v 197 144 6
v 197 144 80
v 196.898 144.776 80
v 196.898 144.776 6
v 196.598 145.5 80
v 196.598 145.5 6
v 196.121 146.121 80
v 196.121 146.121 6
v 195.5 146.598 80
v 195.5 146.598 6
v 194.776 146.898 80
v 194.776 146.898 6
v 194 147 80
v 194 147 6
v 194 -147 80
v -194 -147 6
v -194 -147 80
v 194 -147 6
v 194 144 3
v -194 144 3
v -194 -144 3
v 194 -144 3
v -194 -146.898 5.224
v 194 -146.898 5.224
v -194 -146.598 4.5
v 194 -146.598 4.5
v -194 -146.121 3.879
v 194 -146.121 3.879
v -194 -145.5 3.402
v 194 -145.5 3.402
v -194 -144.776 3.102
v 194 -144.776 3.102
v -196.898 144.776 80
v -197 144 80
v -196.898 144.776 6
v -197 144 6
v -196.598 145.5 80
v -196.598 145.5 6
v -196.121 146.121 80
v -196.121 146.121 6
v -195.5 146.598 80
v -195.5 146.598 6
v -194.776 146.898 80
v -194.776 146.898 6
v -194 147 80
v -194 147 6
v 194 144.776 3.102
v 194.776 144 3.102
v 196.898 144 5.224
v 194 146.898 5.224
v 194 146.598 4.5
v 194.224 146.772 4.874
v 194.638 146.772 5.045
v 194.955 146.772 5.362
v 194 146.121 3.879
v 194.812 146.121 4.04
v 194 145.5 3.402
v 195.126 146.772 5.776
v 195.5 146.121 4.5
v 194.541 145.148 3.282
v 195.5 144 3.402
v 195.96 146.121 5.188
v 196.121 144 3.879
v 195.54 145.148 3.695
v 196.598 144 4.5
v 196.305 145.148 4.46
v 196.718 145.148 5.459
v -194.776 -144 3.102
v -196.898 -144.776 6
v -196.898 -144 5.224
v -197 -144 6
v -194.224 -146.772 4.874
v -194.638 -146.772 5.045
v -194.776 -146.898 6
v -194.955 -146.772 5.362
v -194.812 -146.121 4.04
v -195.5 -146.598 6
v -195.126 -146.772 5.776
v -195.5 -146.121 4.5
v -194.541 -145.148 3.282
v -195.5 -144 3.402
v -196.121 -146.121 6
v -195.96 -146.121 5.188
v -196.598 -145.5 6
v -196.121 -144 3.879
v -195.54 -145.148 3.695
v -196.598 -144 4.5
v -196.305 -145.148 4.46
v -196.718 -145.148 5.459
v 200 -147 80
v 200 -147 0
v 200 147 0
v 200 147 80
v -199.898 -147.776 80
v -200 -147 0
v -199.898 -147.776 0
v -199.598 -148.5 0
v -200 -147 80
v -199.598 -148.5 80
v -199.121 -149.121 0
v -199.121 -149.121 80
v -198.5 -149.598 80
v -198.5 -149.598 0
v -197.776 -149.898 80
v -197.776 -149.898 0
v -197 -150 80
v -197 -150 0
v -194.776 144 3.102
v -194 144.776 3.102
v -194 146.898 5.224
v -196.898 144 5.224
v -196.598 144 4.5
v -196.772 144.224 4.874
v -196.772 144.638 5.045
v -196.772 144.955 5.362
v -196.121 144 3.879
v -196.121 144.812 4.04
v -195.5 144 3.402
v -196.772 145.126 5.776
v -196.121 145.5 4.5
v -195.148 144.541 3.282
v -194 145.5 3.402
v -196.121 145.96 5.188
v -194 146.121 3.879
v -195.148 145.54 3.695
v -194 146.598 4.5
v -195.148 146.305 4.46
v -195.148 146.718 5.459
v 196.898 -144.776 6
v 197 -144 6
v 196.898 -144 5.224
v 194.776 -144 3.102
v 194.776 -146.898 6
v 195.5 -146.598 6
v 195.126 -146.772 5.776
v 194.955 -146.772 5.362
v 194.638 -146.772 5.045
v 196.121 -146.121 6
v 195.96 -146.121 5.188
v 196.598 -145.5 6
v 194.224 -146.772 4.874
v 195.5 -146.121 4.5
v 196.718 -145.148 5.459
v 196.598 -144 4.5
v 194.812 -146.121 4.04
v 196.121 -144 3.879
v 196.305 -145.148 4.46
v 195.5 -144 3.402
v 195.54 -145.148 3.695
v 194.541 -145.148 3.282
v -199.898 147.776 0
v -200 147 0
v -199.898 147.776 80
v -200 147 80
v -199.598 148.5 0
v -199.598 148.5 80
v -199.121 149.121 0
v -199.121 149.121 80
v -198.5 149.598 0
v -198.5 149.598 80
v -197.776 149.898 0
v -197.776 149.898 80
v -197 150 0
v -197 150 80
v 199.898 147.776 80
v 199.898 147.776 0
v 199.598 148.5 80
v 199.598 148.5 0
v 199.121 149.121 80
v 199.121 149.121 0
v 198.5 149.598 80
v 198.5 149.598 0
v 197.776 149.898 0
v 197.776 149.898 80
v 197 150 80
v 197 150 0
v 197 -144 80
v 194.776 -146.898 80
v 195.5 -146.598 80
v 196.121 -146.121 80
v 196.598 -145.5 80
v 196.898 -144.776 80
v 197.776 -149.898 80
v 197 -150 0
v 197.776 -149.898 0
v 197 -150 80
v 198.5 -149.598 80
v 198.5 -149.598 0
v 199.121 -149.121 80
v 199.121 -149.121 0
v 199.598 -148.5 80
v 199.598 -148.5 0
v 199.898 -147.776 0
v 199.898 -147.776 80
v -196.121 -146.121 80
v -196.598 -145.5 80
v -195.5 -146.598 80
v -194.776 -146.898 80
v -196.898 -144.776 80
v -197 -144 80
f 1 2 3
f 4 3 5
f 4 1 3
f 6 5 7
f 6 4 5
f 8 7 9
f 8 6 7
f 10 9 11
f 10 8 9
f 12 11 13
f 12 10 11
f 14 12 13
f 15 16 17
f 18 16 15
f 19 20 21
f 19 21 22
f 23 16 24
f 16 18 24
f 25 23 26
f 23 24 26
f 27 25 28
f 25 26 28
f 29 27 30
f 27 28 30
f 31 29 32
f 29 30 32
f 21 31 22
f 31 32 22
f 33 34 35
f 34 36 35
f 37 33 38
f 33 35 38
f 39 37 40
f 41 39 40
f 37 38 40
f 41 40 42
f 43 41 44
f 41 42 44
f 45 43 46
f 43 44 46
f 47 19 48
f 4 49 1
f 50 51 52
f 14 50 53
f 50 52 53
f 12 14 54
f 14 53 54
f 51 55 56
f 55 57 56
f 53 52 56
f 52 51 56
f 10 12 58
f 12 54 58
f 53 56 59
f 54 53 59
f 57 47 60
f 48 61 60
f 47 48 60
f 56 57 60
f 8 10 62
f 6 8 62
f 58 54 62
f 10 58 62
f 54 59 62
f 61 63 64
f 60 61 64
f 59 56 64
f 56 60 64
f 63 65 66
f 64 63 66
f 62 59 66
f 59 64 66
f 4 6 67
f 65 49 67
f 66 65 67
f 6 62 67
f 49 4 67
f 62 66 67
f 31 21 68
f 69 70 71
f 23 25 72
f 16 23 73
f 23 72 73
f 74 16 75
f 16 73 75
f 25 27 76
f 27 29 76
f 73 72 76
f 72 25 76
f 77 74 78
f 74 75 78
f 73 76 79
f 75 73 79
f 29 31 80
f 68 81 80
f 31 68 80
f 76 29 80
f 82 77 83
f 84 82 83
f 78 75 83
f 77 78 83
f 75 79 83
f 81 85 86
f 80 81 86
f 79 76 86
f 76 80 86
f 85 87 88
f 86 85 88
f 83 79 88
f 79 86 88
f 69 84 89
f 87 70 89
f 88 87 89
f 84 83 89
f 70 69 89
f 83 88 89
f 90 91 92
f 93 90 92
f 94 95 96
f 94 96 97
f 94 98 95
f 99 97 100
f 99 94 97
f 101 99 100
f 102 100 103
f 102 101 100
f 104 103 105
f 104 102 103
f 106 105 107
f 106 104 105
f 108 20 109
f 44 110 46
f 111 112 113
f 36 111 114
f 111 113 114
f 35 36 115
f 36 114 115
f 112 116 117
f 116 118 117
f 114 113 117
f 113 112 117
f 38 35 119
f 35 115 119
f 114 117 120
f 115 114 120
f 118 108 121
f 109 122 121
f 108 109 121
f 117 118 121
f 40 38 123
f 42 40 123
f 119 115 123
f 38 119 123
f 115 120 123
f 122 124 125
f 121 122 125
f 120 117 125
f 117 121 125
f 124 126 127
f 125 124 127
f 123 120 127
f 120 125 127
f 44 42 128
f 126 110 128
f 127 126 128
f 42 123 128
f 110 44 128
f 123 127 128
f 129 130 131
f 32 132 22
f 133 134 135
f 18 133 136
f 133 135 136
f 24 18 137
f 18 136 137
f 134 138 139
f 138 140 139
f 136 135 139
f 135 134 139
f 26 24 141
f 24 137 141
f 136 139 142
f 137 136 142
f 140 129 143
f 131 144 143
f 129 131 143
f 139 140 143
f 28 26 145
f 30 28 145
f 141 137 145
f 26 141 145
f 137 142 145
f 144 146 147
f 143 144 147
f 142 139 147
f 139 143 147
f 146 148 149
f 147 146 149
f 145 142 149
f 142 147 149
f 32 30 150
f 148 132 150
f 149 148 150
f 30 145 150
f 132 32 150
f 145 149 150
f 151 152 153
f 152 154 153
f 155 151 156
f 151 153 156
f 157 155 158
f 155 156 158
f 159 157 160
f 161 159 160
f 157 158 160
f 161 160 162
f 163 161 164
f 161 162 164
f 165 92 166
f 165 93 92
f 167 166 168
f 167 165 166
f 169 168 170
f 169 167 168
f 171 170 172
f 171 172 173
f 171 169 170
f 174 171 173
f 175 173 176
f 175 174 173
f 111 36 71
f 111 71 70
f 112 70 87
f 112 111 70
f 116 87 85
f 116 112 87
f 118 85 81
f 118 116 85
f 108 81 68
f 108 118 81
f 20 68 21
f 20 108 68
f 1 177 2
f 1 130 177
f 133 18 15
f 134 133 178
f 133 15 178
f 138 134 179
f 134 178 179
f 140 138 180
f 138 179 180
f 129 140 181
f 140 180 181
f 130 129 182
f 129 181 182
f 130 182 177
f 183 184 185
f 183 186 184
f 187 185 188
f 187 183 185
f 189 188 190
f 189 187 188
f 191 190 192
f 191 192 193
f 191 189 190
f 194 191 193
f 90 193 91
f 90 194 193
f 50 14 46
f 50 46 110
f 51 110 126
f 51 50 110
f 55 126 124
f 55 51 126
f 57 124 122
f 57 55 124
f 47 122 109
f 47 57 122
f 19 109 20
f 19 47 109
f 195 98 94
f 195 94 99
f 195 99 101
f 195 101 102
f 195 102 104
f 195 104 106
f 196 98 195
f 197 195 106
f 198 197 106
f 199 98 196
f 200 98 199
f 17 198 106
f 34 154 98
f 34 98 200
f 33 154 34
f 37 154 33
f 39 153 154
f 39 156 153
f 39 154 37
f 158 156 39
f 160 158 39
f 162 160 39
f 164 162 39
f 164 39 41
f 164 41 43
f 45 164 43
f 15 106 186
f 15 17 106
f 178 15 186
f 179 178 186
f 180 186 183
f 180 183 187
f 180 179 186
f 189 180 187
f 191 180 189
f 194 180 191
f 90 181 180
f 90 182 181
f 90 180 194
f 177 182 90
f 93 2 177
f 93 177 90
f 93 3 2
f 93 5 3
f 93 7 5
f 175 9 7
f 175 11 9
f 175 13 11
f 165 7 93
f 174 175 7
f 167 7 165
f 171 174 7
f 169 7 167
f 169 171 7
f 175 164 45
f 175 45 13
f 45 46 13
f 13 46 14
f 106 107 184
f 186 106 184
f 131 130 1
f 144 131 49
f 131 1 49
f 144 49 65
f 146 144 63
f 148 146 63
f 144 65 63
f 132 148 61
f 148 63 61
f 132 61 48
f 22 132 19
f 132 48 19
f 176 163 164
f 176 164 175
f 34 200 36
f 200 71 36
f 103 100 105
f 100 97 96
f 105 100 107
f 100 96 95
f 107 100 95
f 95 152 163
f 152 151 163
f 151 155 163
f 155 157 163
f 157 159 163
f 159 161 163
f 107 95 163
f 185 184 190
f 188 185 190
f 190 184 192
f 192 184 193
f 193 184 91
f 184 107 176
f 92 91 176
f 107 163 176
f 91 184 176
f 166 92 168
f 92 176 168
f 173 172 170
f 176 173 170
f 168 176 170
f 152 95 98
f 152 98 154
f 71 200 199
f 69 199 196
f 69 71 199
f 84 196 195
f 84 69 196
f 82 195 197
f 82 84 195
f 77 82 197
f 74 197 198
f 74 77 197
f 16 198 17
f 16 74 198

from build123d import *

# Parameters (mm, degrees)
SKETCH_1_W      = 400
SKETCH_1_H      = 300
EXTRUDE_1_DEPTH = 80
SHELL_1_T       = -3
FILLET_1_R      = 3
FILLET_2_R      = 3


with BuildPart() as part:
    # 草图1 → 凸台-拉伸1 (new body)
    with BuildSketch(Plane.XY):
        Rectangle(SKETCH_1_W, SKETCH_1_H)
    extrude(amount=EXTRUDE_1_DEPTH)

    # 抽壳1
    shell_1_openings = [part.faces().sort_by_distance(p)[0] for p in [
        (0, 0, 80),
    ]]
    offset(amount=SHELL_1_T, openings=shell_1_openings, kind=Kind.INTERSECTION)

    # 圆角1
    fillet_1_edges = [part.edges().sort_by_distance(p)[0] for p in [
        (197, 0, 3),
        (197, -147, 41.5),
        (0, 147, 3),
        (197, 147, 41.5),
        (-197, 0, 3),
        (-197, 147, 41.5),
        (0, -147, 3),
        (-197, -147, 41.5),
    ]]
    fillet(fillet_1_edges, radius=FILLET_1_R)

    # 圆角2
    fillet_2_edges = [part.edges().sort_by_distance(p)[0] for p in [
        (200, -150, 40),
        (-200, -150, 40),
        (-200, 150, 40),
        (200, 150, 40),
    ]]
    fillet(fillet_2_edges, radius=FILLET_2_R)


solid = part.part
